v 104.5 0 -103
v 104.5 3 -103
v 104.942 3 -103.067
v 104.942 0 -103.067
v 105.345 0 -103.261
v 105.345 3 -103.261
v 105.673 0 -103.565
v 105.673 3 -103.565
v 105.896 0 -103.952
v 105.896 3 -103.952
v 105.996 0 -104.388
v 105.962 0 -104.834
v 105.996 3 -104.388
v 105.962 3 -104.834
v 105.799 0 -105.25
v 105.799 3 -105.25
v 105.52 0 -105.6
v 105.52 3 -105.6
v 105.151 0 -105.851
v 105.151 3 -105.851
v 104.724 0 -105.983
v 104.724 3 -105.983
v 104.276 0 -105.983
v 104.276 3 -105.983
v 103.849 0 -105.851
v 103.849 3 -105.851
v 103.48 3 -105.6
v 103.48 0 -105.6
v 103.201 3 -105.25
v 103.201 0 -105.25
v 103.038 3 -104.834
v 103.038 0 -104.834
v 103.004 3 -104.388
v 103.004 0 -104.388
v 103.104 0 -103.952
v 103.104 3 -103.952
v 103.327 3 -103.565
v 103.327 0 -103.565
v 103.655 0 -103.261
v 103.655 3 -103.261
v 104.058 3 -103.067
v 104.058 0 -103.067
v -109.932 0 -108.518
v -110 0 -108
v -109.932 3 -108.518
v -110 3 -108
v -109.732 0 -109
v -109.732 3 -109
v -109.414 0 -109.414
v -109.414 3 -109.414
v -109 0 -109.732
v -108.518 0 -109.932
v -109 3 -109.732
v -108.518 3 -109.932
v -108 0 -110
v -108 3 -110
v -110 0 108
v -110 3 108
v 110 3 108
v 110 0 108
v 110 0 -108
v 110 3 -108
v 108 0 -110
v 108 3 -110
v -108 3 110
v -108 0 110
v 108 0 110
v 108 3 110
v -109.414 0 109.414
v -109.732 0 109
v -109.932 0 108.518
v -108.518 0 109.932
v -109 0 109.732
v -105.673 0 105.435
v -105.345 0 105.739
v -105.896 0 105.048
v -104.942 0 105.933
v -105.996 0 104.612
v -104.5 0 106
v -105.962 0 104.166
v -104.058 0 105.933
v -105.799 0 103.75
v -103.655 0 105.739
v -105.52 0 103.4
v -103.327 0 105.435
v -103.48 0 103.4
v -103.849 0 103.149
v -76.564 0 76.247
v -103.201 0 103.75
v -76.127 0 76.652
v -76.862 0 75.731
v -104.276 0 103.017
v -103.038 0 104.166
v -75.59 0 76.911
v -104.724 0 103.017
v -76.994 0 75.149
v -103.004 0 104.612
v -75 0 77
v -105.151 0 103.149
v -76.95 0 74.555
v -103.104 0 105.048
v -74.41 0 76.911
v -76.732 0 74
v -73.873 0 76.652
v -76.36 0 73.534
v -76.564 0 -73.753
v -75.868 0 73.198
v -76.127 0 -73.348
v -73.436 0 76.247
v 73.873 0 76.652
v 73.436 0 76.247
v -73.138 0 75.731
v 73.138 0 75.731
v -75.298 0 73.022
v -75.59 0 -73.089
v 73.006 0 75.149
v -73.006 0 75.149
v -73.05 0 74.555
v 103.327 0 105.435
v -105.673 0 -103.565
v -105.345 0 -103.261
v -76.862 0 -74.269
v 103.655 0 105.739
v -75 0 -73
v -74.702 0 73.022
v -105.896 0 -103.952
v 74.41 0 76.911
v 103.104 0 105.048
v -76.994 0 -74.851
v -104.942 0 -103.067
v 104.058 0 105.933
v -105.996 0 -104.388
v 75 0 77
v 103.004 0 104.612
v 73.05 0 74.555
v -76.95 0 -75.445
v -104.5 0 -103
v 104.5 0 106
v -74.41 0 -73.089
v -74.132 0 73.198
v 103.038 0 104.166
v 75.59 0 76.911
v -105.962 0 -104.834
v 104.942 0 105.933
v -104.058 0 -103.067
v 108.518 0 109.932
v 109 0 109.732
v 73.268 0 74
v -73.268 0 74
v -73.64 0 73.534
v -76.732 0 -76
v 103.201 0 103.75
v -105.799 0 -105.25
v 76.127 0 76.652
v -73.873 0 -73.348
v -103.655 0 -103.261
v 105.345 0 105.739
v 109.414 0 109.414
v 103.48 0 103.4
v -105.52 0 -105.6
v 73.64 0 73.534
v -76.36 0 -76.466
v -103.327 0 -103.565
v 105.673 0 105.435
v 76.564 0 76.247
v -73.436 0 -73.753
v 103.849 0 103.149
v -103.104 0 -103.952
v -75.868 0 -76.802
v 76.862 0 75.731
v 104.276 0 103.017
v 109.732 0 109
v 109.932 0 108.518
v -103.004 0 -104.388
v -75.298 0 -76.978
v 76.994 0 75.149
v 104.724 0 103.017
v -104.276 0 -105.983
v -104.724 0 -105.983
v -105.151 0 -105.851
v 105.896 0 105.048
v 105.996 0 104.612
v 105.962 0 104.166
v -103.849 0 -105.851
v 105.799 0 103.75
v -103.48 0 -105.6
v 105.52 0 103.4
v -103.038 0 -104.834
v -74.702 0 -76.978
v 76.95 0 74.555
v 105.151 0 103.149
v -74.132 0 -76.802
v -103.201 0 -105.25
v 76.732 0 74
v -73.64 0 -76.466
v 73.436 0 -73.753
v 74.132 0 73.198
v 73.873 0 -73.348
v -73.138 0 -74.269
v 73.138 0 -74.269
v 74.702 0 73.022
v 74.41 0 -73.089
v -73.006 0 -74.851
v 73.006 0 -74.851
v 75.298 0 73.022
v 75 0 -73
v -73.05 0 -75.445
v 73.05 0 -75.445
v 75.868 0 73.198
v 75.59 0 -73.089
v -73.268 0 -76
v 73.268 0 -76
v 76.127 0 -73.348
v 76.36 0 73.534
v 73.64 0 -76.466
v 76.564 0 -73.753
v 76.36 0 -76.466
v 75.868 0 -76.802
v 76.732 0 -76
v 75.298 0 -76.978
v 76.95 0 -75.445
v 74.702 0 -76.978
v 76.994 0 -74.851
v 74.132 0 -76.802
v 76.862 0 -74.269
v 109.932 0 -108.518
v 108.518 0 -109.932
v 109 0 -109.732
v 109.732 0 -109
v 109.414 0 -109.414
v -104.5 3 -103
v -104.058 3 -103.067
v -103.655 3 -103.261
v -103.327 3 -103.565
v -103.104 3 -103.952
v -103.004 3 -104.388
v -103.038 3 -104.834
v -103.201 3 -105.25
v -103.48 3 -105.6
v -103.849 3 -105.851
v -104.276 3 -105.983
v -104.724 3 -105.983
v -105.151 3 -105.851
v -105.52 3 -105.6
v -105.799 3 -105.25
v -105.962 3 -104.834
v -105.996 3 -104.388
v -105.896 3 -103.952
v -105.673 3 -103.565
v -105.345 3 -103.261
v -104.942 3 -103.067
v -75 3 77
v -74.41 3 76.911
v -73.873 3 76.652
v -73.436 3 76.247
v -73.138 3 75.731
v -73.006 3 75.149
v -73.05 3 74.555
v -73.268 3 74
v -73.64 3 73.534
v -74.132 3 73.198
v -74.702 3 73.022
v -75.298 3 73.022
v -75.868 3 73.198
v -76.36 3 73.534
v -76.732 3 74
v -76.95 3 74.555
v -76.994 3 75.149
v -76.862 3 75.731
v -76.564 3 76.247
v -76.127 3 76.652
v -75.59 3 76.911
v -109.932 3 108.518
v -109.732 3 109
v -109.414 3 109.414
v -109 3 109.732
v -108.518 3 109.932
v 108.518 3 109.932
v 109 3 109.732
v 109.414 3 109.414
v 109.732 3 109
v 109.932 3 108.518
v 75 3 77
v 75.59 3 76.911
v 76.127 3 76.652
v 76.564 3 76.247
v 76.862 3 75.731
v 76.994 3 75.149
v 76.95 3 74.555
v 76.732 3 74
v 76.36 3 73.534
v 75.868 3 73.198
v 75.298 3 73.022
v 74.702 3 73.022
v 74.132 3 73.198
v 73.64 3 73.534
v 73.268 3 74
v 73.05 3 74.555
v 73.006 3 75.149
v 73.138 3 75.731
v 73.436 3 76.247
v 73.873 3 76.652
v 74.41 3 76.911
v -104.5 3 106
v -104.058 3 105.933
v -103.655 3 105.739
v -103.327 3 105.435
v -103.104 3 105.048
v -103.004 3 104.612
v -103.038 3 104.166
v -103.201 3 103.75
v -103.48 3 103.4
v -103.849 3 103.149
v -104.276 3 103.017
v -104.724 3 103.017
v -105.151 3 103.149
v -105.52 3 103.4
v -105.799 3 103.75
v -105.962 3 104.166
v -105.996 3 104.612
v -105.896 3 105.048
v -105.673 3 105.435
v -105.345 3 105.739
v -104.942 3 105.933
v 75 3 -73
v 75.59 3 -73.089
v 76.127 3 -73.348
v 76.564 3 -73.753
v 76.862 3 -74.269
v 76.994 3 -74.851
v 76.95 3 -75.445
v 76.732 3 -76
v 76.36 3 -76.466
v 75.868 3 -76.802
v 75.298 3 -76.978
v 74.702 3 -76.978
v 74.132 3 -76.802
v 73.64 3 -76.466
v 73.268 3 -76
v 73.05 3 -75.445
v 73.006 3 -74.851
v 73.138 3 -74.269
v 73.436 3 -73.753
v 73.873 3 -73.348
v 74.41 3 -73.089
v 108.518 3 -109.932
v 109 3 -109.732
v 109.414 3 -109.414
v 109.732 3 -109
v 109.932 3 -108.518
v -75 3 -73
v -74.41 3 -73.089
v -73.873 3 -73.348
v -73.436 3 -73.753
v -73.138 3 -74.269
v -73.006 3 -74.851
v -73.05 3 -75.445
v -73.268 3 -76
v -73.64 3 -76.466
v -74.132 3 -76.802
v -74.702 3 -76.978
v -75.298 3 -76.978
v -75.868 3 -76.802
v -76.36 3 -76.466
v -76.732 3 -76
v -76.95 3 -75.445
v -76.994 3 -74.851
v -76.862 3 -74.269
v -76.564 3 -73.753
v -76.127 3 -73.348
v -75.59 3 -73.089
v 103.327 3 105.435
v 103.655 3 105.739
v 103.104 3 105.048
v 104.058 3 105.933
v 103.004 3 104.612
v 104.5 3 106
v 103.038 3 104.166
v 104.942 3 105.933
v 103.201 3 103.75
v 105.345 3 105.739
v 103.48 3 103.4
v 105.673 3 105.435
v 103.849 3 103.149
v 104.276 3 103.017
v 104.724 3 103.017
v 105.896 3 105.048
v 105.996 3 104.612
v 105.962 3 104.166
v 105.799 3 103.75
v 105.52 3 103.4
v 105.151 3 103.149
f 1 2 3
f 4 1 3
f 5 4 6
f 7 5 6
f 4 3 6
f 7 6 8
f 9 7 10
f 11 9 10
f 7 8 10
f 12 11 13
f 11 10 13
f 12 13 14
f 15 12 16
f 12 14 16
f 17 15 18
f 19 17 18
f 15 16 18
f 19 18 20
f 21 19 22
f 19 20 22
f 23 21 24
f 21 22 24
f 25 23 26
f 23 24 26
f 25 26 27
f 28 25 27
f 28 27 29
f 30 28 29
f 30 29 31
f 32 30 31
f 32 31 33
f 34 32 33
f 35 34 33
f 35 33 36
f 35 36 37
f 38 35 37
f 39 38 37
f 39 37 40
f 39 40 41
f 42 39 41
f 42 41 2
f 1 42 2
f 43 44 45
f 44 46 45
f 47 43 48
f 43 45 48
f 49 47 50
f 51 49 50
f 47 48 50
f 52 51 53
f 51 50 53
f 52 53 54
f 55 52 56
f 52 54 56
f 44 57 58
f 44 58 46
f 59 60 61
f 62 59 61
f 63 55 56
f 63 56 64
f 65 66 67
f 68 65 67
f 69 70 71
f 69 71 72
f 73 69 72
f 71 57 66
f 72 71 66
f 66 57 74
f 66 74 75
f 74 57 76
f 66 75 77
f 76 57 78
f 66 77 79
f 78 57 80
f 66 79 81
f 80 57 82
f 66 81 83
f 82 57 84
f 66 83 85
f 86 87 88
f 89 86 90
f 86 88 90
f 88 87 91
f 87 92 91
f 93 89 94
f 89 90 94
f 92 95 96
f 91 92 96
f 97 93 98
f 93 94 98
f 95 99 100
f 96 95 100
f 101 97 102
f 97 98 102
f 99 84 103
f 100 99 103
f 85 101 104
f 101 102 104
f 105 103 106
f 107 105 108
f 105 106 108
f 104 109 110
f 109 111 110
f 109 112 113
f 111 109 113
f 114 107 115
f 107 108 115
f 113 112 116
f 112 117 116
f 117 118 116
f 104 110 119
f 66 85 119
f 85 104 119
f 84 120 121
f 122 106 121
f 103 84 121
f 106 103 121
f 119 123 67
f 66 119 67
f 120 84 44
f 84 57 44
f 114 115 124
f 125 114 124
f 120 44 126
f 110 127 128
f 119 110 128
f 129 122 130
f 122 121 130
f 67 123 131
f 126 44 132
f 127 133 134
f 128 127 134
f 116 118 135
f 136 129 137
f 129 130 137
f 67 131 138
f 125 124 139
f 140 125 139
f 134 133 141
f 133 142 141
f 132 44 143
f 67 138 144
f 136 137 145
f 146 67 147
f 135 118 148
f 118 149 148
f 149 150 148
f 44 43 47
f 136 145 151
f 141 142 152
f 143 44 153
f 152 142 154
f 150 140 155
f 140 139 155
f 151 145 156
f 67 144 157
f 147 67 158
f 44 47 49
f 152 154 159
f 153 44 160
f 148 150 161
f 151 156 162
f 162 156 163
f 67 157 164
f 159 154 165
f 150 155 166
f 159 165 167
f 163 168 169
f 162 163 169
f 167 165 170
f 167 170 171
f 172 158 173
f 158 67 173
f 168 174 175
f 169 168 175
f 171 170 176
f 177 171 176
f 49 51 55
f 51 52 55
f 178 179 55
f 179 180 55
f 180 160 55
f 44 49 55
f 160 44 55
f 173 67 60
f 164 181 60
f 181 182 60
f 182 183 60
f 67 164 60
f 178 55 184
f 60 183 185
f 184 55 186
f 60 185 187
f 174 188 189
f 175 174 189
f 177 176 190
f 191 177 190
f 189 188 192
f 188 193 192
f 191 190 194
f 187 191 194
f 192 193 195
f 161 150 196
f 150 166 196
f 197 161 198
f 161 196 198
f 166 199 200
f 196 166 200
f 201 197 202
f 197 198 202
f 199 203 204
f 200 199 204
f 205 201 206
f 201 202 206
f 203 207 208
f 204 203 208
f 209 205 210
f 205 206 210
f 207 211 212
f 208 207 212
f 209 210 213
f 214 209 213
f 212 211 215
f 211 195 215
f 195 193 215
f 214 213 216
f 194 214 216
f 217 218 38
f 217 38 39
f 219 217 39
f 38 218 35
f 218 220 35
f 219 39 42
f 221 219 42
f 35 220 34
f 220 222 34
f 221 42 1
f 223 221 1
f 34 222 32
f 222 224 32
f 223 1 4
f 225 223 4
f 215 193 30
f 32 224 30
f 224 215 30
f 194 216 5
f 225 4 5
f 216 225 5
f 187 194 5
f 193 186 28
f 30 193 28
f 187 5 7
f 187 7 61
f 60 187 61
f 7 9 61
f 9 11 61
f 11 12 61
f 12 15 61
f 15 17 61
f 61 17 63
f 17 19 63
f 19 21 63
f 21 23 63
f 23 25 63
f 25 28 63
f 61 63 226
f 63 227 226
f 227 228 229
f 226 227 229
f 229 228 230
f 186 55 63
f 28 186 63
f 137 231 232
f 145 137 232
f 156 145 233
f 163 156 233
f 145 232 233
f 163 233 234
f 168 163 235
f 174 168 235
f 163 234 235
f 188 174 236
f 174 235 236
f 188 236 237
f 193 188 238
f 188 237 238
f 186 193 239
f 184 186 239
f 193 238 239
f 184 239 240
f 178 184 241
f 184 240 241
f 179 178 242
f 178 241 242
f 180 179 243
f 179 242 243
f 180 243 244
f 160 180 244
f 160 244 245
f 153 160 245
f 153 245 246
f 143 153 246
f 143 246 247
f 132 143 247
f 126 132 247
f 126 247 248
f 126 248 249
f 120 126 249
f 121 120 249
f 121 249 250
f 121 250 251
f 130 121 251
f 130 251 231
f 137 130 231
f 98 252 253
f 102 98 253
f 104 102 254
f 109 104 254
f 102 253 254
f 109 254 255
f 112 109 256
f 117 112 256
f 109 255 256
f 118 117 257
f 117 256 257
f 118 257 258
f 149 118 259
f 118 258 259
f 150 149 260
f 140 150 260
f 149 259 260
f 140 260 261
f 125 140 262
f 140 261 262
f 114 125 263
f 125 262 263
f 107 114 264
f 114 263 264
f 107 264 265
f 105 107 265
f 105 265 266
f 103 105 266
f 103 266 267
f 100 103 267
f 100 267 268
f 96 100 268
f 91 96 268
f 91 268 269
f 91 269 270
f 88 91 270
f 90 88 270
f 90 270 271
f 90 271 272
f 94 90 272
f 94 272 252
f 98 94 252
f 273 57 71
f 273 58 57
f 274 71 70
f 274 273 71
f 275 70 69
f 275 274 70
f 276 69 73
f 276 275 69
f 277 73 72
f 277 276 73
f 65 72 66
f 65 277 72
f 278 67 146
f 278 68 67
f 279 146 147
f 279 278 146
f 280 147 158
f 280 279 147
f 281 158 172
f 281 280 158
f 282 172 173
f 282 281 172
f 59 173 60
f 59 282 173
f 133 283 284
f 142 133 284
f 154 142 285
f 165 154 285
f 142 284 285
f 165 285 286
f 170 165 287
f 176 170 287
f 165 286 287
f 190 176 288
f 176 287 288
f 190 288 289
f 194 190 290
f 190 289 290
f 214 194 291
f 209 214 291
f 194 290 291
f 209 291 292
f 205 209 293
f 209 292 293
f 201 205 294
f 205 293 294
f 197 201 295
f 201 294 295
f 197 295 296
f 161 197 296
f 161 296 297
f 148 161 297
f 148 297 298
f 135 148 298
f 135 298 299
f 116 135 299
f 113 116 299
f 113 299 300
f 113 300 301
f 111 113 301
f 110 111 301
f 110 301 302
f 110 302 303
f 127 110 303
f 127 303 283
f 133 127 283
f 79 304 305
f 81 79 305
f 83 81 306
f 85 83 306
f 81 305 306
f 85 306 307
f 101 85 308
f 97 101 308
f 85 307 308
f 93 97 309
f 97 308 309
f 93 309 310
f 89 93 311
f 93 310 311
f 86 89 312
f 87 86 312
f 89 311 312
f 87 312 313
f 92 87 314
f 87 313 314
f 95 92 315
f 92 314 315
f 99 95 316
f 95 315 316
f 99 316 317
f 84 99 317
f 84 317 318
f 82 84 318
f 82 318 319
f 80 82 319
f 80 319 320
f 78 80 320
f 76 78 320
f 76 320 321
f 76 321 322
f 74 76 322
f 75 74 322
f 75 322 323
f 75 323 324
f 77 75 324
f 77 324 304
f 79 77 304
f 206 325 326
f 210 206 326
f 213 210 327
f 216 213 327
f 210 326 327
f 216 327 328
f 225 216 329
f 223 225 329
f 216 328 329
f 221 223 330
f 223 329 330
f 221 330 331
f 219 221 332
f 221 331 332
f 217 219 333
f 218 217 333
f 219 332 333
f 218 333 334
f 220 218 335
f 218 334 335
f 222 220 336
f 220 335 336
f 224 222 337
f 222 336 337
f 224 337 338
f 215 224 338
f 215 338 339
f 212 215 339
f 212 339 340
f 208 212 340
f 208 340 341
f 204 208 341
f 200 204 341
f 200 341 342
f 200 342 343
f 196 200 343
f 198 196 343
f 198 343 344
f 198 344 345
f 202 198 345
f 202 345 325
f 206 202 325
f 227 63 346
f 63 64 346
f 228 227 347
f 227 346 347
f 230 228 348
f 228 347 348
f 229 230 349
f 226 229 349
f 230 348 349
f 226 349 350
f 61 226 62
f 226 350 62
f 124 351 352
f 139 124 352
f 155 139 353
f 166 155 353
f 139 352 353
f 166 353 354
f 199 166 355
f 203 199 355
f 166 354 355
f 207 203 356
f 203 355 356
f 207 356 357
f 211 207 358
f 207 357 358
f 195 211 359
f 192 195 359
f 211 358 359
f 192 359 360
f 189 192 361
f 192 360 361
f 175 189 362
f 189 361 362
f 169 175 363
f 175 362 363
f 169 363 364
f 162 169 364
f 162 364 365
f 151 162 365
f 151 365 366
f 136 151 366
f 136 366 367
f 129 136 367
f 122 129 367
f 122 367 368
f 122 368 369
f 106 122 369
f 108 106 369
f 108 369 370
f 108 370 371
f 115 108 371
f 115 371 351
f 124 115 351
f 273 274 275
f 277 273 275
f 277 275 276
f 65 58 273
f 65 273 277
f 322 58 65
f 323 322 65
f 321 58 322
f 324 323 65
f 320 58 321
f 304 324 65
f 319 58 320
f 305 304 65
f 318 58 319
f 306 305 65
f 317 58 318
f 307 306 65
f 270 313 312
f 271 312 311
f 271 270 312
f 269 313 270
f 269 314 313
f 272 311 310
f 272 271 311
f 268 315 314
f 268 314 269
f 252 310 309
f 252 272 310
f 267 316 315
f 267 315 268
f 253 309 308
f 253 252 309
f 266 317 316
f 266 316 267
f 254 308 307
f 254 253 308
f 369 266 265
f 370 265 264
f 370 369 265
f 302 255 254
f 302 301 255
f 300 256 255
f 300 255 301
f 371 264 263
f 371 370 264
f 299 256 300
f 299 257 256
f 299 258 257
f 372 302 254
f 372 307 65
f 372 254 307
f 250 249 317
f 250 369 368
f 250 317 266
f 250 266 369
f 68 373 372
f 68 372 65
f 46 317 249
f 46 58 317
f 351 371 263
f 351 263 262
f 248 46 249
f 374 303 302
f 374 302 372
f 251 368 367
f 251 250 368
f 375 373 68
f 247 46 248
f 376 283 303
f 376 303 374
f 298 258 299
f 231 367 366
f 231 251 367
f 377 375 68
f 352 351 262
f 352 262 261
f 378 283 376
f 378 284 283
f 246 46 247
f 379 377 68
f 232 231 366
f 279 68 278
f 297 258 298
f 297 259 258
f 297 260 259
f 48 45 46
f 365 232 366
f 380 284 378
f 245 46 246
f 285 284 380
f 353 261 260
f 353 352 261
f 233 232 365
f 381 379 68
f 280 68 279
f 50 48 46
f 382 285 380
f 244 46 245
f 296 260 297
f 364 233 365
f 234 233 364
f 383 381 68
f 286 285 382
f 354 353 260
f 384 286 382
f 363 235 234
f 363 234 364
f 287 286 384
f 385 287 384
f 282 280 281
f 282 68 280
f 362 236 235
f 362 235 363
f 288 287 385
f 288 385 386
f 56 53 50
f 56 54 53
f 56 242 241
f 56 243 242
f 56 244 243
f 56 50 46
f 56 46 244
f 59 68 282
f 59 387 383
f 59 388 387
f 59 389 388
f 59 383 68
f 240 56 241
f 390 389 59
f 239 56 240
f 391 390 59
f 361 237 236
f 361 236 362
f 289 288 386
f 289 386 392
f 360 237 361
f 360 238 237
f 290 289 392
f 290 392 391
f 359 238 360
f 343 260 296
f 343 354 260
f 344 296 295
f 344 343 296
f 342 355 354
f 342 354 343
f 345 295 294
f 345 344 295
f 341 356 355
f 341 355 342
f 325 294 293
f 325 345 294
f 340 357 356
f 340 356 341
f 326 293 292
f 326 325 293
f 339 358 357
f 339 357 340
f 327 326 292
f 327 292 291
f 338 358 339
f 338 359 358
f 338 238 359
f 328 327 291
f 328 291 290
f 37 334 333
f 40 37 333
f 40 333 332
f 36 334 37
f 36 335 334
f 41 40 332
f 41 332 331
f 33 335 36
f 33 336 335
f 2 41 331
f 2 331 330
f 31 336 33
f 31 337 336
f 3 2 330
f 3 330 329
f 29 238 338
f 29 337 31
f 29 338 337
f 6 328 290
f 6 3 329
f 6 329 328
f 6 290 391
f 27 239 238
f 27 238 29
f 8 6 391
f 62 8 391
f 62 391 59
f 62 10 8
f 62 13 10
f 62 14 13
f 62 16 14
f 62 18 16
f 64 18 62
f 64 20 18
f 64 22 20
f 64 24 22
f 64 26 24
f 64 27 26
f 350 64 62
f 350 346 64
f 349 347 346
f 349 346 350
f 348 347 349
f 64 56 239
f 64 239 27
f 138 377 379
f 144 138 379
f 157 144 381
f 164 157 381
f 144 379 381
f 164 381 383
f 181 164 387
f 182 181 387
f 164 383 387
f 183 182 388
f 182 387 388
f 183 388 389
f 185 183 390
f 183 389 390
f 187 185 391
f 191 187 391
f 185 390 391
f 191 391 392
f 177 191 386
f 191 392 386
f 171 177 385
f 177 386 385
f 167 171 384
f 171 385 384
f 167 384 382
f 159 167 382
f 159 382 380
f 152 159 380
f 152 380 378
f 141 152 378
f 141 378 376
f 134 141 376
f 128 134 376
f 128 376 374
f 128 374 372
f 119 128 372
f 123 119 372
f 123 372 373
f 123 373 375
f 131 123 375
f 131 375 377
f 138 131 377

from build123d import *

# Parameters (mm, degrees)
SKETCH1_W           = 220
SKETCH1_H           = 220
BOSS_EXTRUDE1_DEPTH = 3
SKETCH3_R           = 2
SKETCH3_R_2         = 1.5
CUT_EXTRUDE1_DEPTH  = 10
FILLET1_R           = 2


with BuildPart() as part:
    # Sketch1 → Boss-Extrude1 (new body)
    with BuildSketch(Plane(origin=(0, 0, 0), x_dir=(1, 0, 0), z_dir=(0, 1, 0))):
        Rectangle(SKETCH1_W, SKETCH1_H)
    extrude(amount=BOSS_EXTRUDE1_DEPTH)

    # Sketch3 → Cut-Extrude1 (cut)
    with BuildSketch(Plane(origin=(0, 3, 0), x_dir=(1, 0, 0), z_dir=(0, 1, 0))):
        with Locations(Location((-75, 75, 0), (0, 0, 270))):
            Circle(SKETCH3_R)
        with Locations(Location((75, 75, 0), (0, 0, 270))):
            Circle(SKETCH3_R)
        with Locations(Location((75, -75, 0), (0, 0, 270))):
            Circle(SKETCH3_R)
        with Locations(Location((-75, -75, 0), (0, 0, 270))):
            Circle(SKETCH3_R)
        with Locations(Location((-104.5, 104.5, 0), (0, 0, 270))):
            Circle(SKETCH3_R_2)
        with Locations(Location((104.5, 104.5, 0), (0, 0, 270))):
            Circle(SKETCH3_R_2)
        with Locations(Location((104.5, -104.5, 0), (0, 0, 270))):
            Circle(SKETCH3_R_2)
        with Locations(Location((-104.5, -104.5, 0), (0, 0, 270))):
            Circle(SKETCH3_R_2)
    extrude(amount=-CUT_EXTRUDE1_DEPTH, mode=Mode.SUBTRACT)

    # Fillet1
    fillet1_edges = [part.edges().sort_by_distance(p)[0] for p in [
        (-110, 1.5, -110),
        (110, 1.5, -110),
        (110, 1.5, 110),
        (-110, 1.5, 110),
    ]]
    fillet(fillet1_edges, radius=FILLET1_R)


solid = part.part
